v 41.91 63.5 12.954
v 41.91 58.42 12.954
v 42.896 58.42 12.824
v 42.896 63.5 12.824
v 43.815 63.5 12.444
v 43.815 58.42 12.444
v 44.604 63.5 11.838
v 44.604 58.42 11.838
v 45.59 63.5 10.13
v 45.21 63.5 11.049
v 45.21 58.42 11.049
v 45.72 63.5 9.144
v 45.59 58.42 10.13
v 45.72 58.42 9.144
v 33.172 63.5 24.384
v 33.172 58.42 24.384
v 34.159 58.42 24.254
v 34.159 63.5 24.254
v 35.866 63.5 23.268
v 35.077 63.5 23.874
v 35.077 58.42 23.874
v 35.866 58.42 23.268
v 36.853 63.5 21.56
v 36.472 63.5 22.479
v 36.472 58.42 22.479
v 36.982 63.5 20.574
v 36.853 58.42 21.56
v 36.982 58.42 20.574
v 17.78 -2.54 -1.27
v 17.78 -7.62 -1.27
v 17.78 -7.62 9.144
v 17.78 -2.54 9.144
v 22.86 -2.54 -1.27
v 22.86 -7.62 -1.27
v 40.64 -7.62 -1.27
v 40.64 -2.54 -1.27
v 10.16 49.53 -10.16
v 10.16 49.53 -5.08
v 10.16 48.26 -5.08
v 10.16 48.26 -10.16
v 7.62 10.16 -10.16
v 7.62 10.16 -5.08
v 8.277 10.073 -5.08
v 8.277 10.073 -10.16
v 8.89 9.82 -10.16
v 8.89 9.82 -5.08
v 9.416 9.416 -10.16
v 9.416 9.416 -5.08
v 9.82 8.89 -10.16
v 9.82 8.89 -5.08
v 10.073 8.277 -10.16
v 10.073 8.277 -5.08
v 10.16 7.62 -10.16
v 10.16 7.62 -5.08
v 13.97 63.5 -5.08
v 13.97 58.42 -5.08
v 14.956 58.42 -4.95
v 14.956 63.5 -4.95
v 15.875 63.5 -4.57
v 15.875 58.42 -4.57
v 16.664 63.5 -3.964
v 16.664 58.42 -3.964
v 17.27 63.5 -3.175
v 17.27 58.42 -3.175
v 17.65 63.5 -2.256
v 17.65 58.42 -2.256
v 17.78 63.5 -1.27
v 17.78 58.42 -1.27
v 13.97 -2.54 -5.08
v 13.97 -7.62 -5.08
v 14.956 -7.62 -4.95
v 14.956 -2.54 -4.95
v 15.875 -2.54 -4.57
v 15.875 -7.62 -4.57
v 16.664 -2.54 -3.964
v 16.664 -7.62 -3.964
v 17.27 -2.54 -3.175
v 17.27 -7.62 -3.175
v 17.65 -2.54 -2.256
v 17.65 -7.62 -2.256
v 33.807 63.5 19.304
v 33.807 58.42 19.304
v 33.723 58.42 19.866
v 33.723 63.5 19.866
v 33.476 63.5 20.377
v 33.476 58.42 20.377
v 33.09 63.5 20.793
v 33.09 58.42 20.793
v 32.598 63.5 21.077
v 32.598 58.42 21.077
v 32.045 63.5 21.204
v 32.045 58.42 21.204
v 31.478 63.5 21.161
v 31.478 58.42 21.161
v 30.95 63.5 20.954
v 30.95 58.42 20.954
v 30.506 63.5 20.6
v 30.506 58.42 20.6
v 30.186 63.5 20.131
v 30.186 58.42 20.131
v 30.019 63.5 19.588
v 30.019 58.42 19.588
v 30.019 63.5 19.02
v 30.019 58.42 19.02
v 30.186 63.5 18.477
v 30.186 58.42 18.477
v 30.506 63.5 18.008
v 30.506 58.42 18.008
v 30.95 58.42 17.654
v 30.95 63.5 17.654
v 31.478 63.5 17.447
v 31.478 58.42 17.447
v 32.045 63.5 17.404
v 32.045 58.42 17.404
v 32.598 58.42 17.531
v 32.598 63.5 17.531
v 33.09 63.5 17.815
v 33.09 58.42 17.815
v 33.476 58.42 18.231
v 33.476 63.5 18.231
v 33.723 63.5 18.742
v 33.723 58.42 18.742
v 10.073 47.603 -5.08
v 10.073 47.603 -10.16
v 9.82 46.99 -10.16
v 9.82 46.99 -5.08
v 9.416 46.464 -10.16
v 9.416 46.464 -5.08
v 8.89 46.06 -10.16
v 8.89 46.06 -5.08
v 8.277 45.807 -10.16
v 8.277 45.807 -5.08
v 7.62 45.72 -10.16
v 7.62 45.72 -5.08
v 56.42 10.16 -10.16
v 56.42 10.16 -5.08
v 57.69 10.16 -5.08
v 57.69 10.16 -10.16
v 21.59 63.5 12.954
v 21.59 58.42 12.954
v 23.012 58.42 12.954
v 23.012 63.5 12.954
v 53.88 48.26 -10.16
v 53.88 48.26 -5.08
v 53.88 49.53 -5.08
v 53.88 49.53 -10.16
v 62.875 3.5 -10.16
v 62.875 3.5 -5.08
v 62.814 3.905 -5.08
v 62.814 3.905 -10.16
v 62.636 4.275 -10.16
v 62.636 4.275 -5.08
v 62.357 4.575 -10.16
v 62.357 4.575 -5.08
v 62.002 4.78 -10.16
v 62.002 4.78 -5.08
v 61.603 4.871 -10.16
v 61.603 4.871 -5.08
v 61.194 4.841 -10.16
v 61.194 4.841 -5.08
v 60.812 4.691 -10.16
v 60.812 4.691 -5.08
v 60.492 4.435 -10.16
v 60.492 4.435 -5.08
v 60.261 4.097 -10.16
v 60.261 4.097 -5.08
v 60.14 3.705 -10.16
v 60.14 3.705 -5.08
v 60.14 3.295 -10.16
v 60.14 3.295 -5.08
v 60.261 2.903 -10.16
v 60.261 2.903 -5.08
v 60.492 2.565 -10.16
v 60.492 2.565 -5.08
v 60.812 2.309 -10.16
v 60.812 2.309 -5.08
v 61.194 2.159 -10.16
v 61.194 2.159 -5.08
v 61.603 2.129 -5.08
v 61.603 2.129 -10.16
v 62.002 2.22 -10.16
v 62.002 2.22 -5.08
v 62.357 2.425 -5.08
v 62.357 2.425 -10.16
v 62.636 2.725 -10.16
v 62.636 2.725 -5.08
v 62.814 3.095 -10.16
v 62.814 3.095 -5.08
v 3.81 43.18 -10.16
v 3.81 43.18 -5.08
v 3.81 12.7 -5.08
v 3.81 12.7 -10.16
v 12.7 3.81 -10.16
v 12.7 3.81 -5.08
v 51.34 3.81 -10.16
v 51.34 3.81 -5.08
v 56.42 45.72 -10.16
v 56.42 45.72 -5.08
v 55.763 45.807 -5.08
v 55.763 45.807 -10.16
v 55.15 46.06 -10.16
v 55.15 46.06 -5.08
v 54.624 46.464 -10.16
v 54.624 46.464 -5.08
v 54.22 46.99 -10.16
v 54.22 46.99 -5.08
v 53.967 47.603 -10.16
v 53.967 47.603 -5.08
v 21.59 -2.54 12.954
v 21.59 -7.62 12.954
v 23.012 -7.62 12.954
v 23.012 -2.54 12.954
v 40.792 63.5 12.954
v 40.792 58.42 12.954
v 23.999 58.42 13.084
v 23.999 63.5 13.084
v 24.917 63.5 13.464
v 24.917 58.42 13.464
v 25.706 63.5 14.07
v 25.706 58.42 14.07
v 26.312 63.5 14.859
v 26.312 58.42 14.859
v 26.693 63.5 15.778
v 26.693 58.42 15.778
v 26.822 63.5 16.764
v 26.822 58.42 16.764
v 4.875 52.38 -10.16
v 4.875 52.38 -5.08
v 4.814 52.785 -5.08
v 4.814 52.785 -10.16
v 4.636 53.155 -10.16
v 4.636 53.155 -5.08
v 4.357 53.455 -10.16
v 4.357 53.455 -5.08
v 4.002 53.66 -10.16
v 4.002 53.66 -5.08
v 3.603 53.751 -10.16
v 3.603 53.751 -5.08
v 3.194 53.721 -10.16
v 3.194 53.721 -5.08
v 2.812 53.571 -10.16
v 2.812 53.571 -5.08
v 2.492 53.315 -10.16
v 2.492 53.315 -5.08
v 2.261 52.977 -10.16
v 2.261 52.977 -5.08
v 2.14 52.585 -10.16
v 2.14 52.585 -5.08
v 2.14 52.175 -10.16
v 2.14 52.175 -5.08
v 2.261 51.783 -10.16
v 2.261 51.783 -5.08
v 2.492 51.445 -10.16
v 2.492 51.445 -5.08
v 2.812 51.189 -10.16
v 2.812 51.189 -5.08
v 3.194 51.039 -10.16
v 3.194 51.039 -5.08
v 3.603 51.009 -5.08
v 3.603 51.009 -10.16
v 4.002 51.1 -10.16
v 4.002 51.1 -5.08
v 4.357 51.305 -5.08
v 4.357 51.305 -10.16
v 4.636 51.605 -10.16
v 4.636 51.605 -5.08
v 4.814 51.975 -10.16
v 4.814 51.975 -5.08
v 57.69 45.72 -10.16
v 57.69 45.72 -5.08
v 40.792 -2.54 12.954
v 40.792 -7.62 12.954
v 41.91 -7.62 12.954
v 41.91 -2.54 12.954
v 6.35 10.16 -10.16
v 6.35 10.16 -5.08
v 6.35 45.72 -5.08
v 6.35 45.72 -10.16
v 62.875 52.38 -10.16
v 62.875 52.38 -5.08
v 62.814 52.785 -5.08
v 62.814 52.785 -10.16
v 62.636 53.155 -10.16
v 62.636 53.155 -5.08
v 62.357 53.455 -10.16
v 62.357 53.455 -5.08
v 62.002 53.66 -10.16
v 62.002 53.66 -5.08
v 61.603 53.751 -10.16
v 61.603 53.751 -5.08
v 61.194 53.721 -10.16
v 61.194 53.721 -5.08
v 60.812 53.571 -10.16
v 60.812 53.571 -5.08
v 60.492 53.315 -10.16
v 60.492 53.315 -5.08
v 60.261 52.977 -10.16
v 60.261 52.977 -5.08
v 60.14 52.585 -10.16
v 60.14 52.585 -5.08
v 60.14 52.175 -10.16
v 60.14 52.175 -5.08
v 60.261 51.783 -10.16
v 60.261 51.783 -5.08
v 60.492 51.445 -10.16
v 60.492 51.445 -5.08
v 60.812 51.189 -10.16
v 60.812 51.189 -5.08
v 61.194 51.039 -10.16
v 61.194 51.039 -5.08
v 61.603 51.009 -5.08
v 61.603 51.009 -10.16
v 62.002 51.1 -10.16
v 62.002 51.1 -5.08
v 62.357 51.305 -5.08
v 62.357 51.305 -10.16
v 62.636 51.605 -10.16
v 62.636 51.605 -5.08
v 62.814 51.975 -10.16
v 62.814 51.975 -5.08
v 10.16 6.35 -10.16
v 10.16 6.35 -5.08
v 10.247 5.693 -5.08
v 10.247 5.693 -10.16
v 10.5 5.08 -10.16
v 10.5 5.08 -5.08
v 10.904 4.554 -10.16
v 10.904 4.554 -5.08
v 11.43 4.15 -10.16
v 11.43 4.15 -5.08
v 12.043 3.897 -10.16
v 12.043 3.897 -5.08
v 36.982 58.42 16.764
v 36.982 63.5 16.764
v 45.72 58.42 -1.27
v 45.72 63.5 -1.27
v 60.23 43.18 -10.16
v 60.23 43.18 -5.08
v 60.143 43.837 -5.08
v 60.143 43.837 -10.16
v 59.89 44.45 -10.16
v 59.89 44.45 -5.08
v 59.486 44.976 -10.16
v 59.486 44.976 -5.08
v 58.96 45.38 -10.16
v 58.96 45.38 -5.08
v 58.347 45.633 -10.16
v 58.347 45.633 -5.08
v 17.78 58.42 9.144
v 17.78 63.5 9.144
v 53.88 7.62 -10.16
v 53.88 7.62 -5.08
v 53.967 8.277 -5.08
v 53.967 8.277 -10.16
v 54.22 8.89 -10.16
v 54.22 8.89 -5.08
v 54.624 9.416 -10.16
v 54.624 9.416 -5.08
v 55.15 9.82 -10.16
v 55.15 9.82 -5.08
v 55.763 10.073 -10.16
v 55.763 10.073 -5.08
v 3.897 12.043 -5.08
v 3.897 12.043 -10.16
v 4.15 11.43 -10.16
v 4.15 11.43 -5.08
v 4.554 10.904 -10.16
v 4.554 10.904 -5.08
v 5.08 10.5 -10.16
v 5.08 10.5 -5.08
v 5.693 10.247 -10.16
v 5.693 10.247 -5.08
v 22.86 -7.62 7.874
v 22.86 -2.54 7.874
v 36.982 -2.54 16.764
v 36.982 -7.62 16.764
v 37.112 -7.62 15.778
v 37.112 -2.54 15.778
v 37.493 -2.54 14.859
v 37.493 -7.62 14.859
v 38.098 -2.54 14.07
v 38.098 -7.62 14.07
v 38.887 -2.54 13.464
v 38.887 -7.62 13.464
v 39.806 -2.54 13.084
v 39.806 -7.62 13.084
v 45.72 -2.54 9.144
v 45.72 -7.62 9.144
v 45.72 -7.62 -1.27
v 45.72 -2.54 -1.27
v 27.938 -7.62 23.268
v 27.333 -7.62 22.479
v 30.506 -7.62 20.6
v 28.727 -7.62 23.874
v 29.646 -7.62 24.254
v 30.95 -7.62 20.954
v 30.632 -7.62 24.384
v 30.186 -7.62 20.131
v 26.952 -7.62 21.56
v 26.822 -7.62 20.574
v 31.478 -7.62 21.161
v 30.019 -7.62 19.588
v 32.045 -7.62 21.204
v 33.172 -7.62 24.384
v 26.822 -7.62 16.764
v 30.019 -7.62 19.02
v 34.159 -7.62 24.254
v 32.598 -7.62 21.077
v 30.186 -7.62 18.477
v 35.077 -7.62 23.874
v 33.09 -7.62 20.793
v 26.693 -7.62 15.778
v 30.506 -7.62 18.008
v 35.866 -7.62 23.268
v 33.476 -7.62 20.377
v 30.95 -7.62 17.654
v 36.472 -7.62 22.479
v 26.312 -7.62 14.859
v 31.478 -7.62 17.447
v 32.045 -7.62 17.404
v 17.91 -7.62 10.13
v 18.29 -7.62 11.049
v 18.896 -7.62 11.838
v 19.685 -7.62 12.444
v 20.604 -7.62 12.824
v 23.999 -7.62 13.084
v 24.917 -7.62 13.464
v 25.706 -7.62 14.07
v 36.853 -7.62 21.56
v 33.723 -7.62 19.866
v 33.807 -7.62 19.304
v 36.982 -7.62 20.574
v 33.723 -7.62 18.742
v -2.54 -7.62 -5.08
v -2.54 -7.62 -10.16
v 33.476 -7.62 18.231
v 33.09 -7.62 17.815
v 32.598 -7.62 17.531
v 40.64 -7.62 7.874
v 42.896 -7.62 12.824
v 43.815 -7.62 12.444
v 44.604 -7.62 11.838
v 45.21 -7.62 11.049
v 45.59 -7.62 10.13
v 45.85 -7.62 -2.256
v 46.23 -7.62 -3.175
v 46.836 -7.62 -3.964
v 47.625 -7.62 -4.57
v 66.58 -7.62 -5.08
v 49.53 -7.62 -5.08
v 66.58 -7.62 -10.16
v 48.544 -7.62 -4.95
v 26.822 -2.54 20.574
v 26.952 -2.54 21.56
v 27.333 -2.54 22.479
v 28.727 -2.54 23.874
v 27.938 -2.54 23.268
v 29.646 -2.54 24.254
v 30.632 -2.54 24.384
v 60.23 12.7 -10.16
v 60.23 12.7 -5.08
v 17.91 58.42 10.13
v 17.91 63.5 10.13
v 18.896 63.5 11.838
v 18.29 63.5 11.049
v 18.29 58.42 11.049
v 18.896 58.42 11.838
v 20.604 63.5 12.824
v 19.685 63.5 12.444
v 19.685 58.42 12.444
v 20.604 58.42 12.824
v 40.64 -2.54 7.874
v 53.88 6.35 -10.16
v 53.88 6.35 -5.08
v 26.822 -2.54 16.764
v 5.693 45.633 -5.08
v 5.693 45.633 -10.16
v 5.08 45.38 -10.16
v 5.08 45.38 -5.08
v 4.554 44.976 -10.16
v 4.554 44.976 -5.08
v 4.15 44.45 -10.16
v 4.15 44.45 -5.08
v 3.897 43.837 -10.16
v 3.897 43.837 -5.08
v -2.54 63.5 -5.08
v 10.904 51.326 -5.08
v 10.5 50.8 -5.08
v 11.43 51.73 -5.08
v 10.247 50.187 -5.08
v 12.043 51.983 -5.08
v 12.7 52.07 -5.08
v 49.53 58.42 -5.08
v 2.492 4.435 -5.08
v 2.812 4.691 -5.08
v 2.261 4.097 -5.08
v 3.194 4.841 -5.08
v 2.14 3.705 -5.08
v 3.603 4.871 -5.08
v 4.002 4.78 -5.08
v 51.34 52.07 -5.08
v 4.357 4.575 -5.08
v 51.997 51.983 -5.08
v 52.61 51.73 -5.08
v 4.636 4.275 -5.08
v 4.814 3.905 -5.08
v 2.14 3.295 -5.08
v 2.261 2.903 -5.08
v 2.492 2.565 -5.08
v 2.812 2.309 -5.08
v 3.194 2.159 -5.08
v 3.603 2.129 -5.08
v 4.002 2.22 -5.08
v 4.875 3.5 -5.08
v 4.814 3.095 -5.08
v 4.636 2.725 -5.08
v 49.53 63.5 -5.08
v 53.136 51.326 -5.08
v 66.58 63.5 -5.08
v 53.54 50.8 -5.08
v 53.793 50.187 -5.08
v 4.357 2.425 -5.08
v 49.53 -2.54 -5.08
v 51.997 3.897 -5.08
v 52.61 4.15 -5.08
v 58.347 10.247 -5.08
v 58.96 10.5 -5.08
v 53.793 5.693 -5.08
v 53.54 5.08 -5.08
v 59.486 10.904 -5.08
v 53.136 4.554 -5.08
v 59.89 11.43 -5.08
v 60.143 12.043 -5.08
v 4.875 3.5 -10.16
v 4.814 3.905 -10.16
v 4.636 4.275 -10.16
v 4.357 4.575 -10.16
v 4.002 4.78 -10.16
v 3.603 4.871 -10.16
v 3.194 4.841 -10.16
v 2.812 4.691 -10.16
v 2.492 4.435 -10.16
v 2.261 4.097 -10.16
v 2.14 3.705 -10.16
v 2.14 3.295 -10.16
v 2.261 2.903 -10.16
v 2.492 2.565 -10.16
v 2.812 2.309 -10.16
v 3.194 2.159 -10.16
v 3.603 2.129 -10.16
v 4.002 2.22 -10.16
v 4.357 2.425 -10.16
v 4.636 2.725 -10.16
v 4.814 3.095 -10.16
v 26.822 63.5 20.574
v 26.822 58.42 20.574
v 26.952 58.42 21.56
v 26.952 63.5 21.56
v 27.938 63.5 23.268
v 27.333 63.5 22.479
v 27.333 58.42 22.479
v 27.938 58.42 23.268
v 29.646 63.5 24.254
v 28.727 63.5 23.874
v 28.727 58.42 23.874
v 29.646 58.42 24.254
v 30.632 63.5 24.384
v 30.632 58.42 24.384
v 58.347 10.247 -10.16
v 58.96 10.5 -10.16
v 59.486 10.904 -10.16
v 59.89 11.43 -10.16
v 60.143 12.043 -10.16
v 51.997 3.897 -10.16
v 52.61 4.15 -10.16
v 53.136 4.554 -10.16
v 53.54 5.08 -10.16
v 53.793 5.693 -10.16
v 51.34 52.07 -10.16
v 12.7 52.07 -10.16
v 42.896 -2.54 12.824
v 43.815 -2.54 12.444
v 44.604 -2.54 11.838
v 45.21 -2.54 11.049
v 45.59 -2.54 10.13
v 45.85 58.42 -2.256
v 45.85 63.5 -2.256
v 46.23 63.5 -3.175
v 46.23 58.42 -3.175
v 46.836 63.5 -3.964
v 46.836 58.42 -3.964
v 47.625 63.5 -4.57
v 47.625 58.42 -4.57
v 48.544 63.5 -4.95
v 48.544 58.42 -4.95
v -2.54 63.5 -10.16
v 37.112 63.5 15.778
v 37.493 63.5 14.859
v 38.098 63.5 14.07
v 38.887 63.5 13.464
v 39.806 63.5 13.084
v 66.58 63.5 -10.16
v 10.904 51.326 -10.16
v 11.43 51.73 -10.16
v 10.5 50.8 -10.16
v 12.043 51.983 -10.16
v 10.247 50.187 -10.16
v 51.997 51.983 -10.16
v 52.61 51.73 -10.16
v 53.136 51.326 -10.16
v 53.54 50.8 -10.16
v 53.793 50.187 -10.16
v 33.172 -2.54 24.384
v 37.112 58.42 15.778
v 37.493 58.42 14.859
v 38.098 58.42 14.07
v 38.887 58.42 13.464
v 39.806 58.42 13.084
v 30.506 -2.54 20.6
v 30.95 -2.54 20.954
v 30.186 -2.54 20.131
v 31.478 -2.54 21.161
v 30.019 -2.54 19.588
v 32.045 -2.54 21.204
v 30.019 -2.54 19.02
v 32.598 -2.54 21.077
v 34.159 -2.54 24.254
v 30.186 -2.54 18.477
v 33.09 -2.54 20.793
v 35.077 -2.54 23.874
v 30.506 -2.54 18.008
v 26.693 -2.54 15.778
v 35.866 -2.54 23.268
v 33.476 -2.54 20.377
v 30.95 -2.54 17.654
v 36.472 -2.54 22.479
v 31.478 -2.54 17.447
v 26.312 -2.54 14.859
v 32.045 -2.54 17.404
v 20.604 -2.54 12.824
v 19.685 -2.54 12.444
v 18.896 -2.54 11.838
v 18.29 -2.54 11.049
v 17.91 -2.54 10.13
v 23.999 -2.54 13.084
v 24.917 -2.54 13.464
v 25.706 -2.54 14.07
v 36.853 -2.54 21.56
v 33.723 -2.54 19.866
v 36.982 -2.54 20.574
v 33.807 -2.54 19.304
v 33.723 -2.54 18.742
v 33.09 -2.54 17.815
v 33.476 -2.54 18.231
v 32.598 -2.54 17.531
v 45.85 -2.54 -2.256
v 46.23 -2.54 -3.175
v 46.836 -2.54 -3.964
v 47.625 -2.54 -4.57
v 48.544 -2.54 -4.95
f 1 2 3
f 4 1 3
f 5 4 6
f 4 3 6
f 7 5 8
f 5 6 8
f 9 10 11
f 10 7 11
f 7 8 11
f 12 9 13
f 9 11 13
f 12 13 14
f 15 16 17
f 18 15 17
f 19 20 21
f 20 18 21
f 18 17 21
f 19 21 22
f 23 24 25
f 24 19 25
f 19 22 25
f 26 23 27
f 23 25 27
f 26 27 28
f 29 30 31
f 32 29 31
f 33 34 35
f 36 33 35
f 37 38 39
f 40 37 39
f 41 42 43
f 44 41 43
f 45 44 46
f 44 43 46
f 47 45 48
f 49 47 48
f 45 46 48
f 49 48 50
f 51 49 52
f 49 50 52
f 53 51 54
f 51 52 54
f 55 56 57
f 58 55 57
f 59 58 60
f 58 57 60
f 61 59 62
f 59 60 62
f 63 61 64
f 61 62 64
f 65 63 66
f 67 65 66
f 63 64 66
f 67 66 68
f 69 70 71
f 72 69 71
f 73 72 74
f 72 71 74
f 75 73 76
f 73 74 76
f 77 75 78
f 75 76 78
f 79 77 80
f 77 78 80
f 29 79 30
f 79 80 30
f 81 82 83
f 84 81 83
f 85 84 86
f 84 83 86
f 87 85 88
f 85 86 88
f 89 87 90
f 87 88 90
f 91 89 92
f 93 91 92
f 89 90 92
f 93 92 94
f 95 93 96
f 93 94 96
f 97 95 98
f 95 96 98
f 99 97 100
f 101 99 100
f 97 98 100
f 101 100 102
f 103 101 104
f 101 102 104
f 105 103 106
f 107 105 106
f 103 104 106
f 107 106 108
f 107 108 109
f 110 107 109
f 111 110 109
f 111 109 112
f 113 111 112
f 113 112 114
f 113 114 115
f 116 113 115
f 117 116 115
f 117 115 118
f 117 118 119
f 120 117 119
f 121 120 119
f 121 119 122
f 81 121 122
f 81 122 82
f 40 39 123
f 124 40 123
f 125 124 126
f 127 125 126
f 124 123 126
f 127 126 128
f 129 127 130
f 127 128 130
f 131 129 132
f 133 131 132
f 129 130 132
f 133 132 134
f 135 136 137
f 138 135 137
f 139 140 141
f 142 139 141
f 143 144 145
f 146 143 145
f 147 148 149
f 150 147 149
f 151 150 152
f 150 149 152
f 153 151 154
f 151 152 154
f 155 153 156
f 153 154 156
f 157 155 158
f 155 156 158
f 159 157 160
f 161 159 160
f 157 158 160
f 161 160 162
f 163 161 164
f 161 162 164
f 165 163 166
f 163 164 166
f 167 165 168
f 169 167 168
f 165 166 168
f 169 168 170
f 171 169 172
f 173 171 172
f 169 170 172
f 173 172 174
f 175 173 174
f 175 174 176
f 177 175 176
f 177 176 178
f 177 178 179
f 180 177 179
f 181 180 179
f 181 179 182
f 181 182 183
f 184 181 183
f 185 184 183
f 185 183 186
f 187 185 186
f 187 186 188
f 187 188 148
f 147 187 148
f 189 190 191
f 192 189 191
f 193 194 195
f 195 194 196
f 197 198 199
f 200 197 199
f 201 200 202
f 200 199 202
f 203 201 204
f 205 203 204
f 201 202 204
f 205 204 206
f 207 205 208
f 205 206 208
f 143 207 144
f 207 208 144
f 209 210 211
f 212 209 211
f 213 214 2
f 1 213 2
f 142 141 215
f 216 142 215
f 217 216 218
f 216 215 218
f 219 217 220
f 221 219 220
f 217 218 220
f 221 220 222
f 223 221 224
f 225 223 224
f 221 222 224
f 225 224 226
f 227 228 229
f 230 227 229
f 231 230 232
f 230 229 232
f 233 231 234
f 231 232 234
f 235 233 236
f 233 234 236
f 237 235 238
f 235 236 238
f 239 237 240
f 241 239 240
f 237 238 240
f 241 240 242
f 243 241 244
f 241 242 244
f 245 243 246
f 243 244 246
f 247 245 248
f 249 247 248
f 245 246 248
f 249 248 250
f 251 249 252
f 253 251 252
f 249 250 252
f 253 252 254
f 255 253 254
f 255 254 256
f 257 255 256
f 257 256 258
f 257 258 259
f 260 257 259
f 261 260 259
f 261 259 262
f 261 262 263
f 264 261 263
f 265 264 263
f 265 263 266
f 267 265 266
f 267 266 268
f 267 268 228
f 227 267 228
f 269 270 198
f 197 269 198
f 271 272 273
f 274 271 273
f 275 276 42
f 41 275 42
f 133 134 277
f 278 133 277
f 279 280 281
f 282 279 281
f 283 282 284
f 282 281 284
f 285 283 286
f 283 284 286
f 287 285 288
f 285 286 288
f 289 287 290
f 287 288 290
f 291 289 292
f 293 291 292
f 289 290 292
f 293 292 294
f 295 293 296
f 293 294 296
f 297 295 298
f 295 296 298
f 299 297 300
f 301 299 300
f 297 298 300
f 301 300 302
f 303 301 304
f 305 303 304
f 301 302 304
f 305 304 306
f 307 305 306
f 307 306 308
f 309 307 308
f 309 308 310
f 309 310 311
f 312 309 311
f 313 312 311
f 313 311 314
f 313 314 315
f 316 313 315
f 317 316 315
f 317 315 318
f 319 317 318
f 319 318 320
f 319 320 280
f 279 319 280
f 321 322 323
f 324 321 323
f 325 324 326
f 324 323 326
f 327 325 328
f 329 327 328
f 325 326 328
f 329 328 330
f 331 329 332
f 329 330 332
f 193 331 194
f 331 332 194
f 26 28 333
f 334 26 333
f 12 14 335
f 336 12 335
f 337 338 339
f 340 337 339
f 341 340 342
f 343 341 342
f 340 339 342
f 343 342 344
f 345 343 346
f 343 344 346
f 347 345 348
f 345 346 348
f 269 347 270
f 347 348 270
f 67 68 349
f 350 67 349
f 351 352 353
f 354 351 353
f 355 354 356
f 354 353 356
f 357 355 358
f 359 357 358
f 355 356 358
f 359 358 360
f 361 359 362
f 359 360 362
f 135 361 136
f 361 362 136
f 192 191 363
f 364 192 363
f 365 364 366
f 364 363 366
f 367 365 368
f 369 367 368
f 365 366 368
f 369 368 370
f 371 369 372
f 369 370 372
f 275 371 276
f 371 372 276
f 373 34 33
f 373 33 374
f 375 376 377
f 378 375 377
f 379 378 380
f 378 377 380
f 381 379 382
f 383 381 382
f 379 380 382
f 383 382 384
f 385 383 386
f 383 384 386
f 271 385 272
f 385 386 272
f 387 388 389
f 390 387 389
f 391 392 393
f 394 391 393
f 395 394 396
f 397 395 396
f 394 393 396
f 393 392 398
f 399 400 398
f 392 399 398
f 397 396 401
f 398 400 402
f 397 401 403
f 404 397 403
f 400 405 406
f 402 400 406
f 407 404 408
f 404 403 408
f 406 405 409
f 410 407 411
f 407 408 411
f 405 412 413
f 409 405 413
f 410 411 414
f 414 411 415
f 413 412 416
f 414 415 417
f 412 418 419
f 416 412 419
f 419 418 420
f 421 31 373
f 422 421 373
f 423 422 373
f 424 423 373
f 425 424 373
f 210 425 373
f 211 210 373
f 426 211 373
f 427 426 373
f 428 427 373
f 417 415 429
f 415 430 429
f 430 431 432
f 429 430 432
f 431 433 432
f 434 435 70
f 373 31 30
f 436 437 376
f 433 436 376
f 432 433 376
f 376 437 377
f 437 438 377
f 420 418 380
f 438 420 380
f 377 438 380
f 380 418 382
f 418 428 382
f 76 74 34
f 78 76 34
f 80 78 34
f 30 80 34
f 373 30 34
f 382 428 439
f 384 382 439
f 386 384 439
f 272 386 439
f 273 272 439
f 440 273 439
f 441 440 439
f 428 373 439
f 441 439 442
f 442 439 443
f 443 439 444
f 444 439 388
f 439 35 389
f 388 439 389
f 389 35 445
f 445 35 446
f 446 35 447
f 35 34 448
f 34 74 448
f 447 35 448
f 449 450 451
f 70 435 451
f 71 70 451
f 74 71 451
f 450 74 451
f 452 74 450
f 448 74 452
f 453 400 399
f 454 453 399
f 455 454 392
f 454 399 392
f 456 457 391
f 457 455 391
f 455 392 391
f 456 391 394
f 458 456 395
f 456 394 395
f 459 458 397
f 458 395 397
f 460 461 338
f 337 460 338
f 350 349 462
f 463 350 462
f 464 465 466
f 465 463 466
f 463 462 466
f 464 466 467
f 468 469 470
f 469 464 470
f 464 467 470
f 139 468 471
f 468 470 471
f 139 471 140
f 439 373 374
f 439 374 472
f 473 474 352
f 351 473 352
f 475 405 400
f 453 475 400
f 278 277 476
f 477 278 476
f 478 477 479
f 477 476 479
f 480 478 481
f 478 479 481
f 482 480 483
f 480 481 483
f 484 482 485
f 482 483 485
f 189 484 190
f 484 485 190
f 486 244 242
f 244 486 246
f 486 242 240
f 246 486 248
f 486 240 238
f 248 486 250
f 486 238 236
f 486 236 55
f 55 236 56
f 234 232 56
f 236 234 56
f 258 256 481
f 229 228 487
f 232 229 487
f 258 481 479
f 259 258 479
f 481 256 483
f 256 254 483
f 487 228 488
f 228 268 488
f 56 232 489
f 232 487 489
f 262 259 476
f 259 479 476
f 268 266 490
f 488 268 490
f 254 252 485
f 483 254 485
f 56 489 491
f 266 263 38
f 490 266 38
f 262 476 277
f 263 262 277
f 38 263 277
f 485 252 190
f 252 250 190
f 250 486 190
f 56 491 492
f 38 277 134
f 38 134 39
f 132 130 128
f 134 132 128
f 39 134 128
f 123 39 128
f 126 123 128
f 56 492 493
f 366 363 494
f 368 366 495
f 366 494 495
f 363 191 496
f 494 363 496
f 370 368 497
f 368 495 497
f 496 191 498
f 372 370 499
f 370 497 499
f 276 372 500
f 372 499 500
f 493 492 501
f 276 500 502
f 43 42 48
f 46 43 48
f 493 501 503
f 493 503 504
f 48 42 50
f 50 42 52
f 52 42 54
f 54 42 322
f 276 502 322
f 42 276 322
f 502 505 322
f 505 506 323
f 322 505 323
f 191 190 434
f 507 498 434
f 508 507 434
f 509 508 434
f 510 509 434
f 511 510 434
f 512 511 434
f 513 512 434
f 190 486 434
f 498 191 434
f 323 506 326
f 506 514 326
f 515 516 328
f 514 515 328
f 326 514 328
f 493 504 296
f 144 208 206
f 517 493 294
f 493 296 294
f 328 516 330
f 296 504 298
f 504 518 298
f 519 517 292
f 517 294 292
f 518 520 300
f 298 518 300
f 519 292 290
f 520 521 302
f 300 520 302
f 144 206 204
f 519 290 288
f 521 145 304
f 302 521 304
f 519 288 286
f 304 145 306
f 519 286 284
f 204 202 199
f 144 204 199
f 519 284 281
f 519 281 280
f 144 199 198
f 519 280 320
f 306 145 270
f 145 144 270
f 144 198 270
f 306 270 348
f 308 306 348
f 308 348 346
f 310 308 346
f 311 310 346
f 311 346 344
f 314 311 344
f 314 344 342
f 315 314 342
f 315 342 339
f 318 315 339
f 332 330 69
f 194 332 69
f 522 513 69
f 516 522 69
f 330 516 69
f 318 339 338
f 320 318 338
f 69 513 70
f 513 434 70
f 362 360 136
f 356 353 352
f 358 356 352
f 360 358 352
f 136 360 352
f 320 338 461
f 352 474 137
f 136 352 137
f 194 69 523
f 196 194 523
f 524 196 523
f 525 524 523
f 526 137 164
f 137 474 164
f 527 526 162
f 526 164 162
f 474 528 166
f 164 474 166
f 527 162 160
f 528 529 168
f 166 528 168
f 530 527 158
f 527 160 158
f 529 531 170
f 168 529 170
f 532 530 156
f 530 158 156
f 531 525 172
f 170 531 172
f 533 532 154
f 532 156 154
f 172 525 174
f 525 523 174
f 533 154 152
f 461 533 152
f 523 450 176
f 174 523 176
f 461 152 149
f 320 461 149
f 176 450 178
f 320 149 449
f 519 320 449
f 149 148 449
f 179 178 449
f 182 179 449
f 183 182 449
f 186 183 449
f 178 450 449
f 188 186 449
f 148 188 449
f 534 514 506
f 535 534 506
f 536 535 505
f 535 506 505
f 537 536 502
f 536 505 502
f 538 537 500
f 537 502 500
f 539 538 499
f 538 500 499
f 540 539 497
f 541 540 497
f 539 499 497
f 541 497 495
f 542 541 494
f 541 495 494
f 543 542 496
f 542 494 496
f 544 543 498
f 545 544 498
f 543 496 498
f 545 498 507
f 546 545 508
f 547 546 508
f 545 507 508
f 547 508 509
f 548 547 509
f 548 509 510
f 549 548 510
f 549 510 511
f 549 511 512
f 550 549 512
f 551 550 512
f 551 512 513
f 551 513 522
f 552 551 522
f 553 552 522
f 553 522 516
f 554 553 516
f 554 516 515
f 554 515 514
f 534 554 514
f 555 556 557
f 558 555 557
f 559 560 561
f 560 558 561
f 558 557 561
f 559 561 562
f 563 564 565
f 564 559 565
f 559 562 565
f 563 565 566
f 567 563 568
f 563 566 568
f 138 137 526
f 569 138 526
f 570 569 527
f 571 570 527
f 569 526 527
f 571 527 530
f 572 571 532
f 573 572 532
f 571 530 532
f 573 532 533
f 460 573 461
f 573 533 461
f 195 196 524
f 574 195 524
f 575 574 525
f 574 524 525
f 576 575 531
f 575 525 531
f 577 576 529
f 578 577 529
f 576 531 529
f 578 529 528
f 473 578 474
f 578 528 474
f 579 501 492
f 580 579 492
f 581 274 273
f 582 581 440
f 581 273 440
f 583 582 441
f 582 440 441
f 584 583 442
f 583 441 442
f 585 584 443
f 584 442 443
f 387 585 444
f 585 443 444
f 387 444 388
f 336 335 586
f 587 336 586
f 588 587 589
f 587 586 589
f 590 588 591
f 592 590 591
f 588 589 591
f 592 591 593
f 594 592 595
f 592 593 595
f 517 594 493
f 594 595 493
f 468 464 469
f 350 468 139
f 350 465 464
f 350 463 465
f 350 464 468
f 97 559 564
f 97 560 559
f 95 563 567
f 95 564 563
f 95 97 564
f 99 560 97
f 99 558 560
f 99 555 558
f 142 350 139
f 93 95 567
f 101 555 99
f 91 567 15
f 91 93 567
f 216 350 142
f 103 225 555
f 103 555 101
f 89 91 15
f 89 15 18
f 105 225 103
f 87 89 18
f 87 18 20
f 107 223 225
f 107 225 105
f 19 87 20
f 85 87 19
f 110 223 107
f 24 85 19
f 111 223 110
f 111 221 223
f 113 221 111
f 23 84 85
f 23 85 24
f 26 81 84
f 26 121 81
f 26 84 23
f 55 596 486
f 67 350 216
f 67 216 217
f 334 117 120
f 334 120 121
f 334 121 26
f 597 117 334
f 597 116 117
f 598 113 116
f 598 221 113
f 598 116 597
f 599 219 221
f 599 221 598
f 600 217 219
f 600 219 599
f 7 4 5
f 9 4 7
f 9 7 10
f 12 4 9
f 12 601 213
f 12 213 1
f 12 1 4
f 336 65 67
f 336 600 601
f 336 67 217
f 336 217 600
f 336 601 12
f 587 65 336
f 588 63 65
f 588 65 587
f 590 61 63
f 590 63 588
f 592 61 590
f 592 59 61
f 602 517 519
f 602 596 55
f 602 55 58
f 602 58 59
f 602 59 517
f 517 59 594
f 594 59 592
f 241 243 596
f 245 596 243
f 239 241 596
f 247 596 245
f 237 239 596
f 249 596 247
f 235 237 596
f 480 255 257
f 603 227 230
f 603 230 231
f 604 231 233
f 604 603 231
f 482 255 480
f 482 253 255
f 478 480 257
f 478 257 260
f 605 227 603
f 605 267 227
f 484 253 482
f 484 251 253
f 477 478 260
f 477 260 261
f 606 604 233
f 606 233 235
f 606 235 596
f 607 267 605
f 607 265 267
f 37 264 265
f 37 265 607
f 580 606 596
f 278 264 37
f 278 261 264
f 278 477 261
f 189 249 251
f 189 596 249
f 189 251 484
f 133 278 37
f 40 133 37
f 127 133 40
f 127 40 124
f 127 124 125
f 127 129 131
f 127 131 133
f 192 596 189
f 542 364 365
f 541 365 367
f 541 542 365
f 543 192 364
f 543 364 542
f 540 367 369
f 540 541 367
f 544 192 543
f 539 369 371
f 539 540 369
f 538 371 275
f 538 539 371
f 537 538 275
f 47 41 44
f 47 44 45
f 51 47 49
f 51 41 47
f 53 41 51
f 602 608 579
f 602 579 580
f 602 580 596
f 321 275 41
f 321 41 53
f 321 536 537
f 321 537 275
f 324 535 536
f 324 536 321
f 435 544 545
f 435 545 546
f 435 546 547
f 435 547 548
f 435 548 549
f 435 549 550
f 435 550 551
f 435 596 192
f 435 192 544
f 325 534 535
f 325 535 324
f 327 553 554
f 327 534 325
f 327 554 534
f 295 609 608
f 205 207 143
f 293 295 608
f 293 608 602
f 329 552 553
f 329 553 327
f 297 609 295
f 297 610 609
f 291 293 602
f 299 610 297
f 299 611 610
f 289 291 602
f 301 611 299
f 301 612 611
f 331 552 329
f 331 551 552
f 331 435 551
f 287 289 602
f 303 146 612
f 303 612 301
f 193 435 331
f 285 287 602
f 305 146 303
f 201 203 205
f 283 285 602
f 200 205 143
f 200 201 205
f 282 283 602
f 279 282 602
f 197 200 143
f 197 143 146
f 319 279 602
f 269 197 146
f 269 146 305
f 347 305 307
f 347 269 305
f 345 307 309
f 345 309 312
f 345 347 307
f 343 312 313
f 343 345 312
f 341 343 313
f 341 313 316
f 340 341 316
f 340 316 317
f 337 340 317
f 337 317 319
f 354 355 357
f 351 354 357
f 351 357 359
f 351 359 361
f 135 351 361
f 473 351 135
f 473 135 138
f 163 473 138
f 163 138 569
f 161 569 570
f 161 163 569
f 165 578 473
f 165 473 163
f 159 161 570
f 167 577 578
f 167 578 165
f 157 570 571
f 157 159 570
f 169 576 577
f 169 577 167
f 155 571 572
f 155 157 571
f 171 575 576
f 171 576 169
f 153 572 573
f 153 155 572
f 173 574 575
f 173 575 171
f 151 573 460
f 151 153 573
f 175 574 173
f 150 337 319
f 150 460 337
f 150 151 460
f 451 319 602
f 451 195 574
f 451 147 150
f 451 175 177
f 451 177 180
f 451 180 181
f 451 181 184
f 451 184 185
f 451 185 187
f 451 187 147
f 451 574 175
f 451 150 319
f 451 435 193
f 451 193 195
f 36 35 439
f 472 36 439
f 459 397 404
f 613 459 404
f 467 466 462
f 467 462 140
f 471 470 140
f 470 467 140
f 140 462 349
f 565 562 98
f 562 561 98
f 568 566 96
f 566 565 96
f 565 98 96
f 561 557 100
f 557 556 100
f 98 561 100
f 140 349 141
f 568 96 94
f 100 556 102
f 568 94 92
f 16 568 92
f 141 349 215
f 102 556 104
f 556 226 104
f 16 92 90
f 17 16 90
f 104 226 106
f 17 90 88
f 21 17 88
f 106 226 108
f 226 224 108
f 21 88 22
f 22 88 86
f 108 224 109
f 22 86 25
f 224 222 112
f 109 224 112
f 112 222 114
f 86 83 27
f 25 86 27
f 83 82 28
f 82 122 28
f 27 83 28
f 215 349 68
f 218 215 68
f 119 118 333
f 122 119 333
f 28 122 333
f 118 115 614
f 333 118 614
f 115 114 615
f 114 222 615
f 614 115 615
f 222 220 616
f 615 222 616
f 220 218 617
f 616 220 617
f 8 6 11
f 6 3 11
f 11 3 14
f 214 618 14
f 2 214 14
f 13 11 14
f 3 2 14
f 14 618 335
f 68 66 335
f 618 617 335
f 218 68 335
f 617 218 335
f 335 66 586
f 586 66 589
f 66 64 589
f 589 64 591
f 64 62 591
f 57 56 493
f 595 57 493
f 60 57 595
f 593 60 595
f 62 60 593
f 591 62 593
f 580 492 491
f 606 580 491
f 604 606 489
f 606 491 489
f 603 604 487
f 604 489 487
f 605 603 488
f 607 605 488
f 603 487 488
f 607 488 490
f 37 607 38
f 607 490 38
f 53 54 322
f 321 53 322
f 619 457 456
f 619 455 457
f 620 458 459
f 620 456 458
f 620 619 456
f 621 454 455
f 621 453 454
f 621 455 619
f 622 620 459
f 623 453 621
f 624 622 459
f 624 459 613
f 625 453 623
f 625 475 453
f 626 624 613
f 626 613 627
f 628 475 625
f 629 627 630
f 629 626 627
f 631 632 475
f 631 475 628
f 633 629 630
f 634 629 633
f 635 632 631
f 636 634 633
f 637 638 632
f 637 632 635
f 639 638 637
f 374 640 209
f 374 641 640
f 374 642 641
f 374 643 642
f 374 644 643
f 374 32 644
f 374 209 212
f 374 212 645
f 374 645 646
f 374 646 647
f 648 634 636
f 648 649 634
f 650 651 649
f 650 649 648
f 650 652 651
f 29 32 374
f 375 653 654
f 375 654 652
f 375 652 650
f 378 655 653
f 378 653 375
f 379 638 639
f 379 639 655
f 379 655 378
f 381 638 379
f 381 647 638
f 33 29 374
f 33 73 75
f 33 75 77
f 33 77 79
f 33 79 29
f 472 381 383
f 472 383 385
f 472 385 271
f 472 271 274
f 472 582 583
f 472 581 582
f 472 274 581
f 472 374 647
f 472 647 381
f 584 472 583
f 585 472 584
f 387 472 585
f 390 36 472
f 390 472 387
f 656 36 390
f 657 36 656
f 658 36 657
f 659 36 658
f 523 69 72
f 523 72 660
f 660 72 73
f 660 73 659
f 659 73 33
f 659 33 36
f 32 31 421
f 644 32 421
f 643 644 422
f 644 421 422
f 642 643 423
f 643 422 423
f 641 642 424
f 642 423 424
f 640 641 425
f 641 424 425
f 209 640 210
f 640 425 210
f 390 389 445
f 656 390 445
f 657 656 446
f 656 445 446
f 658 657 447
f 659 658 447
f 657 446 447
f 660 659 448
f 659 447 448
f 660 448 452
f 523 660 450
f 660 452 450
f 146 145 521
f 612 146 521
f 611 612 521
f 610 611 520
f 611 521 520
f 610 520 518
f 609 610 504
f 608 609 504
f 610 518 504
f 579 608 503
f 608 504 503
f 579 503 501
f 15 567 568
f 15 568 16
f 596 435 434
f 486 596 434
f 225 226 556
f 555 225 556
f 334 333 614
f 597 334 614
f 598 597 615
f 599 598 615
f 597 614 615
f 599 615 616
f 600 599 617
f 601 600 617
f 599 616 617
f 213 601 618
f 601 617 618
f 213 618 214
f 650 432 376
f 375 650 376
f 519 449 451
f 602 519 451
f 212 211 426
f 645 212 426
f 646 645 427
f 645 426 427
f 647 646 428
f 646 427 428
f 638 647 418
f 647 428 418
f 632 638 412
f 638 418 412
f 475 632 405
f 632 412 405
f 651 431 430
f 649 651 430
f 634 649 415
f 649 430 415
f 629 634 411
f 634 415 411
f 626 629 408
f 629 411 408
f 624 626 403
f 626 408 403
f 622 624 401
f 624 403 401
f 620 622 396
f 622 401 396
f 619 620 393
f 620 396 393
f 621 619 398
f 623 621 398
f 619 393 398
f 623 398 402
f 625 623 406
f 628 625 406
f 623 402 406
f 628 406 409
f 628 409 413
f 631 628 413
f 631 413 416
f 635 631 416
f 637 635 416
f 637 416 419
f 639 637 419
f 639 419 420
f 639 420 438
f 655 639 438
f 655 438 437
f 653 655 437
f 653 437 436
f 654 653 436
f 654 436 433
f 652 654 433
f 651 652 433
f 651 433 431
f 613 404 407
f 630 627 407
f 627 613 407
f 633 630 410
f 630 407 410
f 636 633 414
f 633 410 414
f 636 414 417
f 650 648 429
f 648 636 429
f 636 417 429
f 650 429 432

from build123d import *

# Parameters (mm, degrees)
F0_W      = 100.33
F0_H      = 71.12
F0_W_2    = 90.17
F0_H_2    = 60.96
F1_DEPTH  = 5.08
F2_W      = 100.33
F2_H      = 71.12
F3_DEPTH  = 5.08
F0_R      = 1.375
F4_DEPTH  = 25.4
F5_R      = 3.1
F5_R_2    = 1.375
F6_DEPTH  = 3.556
F7_DEPTH  = 37.592
F8_W      = 13.716
F8_H      = 3.556
F9_DEPTH  = 5.08
F10_W     = 10.668
F10_H     = 5.715
F10_W_2   = 17.78
F10_H_2   = 9.144
F10_W_3   = 9.398
F10_H_3   = 8.89
F11_DEPTH = 5.08
F12_W     = 53.8226
F12_H     = 18.161
F13_DEPTH = 5.08
F14_R     = 1.905
F15_DEPTH = 71.121
F17_DEPTH = 71.121
F19_DEPTH = 5.08


with BuildPart() as f1:
    # F0 (on Top) → F1 (new body)
    with BuildSketch(Plane.XY):
        with Locations((42.545, 27.94)):
            Rectangle(F0_W, F0_H)
        with Locations((42.545, 27.94)):
            Rectangle(F0_W_2, F0_H_2, mode=Mode.SUBTRACT)
    extrude(amount=-F1_DEPTH)

    # F2 (on face) → F3 (join)
    with BuildSketch(Plane(origin=(0, 0, -5.08), x_dir=(1, 0, 0), z_dir=(0, 0, -1))):
        with Locations((42.545, -27.94)):
            Rectangle(F2_W, F2_H)
    extrude(amount=F3_DEPTH)

    # F0 (on Top) → F4 (cut)
    with BuildSketch(Plane.XY):
        with Locations((3.5, 52.38)):
            Circle(F0_R)
        with Locations((61.5, 52.38)):
            Circle(F0_R)
        with Locations((61.5, 3.5)):
            Circle(F0_R)
        with Locations((3.5, 3.5)):
            Circle(F0_R)
    extrude(amount=-F4_DEPTH, mode=Mode.SUBTRACT)

    # F5 (on face) → F6 (join)
    with BuildSketch(Plane.XY.offset(-5.08)):
        with Locations((3.5, 52.38)):
            Circle(F5_R)
        with Locations((3.5, 52.38)):
            Circle(F5_R_2, mode=Mode.SUBTRACT)
        with Locations((61.5, 52.38)):
            Circle(F5_R)
        with Locations((61.5, 52.38)):
            Circle(F5_R_2, mode=Mode.SUBTRACT)
        with Locations((61.5, 3.5)):
            Circle(F5_R)
        with Locations((61.5, 3.5)):
            Circle(F5_R_2, mode=Mode.SUBTRACT)
        with Locations((3.5, 3.5)):
            Circle(F5_R)
        with Locations((3.5, 3.5)):
            Circle(F5_R_2, mode=Mode.SUBTRACT)
    extrude(amount=F6_DEPTH)

    # F0 (on Top) → F7 (join)
    with BuildSketch(Plane.XY):
        with Locations((42.545, 27.94)):
            Rectangle(F0_W, F0_H)
        with Locations((42.545, 27.94)):
            Rectangle(F0_W_2, F0_H_2, mode=Mode.SUBTRACT)
    extrude(amount=F7_DEPTH)

    # F8 (on face) → F9 (cut, through all)
    with BuildSketch(Plane(origin=(-7.62, 0, 0), x_dir=(0, -1, 0), z_dir=(-1, 0, 0))):
        with Locations((-27.94, -2.032)):
            Rectangle(F8_W, F8_H)
    extrude(amount=-F9_DEPTH, mode=Mode.SUBTRACT)

    # F10 (on face) → F11 (cut, through all)
    with BuildSketch(Plane.XZ.offset(7.62)):
        with Locations((10.922, 1.5875)):
            Rectangle(F10_W, F10_H)
        with Locations((31.75, 3.302)):
            Rectangle(F10_W_2, F10_H_2)
        with Locations((53.594, 3.175)):
            Rectangle(F10_W_3, F10_H_3)
    extrude(amount=-F11_DEPTH, mode=Mode.SUBTRACT)

    # F12 (on face) → F13 (cut, through all)
    with BuildSketch(Plane.YZ.offset(92.71)):
        with Locations((28.8163, 7.8105)):
            Rectangle(F12_W, F12_H)
    extrude(amount=-F13_DEPTH, mode=Mode.SUBTRACT)

    # F14 (on face) → F15 (cut, through all)
    with BuildSketch(Plane.XZ.offset(7.62)):
        with Locations((31.9024, 19.304)):
            Circle(F14_R)
    extrude(amount=-F15_DEPTH, mode=Mode.SUBTRACT)

    # F16 (on face) → F17 (cut, through all)
    with BuildSketch(Plane.XZ.offset(7.62)):
        with BuildLine():
            Line((66.58, -5.08), (66.58, -10.16))
            Line((66.58, -10.16), (92.71, -10.16))
            Line((92.71, -10.16), (92.71, 37.592))
            Line((92.71, 37.592), (-7.62, 37.592))
            Line((-7.62, 37.592), (-7.62, -10.16))
            Line((-7.62, -10.16), (-2.54, -10.16))
            Line((-2.54, -10.16), (-2.54, -5.08))
            Line((-2.54, -5.08), (13.97, -5.08))
            ThreePointArc((13.97, -5.08), (16.664077, -3.964077), (17.78, -1.27))
            Line((17.78, -1.27), (17.78, 9.144))
            ThreePointArc((17.78, 9.144), (18.895923, 11.838077), (21.59, 12.954))
            Line((21.59, 12.954), (23.0124, 12.954))
            ThreePointArc((23.0124, 12.954), (25.706477, 14.069923), (26.8224, 16.764))
            Line((26.8224, 16.764), (26.8224, 20.574))
            ThreePointArc((26.8224, 20.574), (27.938323, 23.268077), (30.6324, 24.384))
            Line((30.6324, 24.384), (33.1724, 24.384))
            ThreePointArc((33.1724, 24.384), (35.866477, 23.268077), (36.9824, 20.574))
            Line((36.9824, 20.574), (36.9824, 16.764))
            ThreePointArc((36.9824, 16.764), (38.098323, 14.069923), (40.7924, 12.954))
            Line((40.7924, 12.954), (41.91, 12.954))
            ThreePointArc((41.91, 12.954), (44.604077, 11.838077), (45.72, 9.144))
            Line((45.72, 9.144), (45.72, -1.27))
            ThreePointArc((45.72, -1.27), (46.835923, -3.964077), (49.53, -5.08))
            Line((49.53, -5.08), (66.58, -5.08))
        make_face()
    extrude(amount=-F17_DEPTH, mode=Mode.SUBTRACT)

    # F18 (on face) → F19 (cut, through all)
    with BuildSketch(Plane.XY.offset(-5.08)):
        with BuildLine():
            Line((56.42, 10.16), (57.69, 10.16))
            ThreePointArc((57.69, 10.16), (59.486051, 10.903949), (60.23, 12.7))
            Line((60.23, 12.7), (60.23, 43.18))
            ThreePointArc((60.23, 43.18), (59.486051, 44.976051), (57.69, 45.72))
            Line((57.69, 45.72), (56.42, 45.72))
            ThreePointArc((56.42, 45.72), (54.623949, 46.463949), (53.88, 48.26))
            Line((53.88, 48.26), (53.88, 49.53))
            ThreePointArc((53.88, 49.53), (53.136051, 51.326051), (51.34, 52.07))
            Line((51.34, 52.07), (12.7, 52.07))
            ThreePointArc((12.7, 52.07), (10.903949, 51.326051), (10.16, 49.53))
            Line((10.16, 49.53), (10.16, 48.26))
            ThreePointArc((10.16, 48.26), (9.416051, 46.463949), (7.62, 45.72))
            Line((7.62, 45.72), (6.35, 45.72))
            ThreePointArc((6.35, 45.72), (4.553949, 44.976051), (3.81, 43.18))
            Line((3.81, 43.18), (3.81, 12.7))
            ThreePointArc((3.81, 12.7), (4.553949, 10.903949), (6.35, 10.16))
            Line((6.35, 10.16), (7.62, 10.16))
            ThreePointArc((7.62, 10.16), (9.416051, 9.416051), (10.16, 7.62))
            Line((10.16, 7.62), (10.16, 6.35))
            ThreePointArc((10.16, 6.35), (10.903949, 4.553949), (12.7, 3.81))
            Line((12.7, 3.81), (51.34, 3.81))
            ThreePointArc((51.34, 3.81), (53.136051, 4.553949), (53.88, 6.35))
            Line((53.88, 6.35), (53.88, 7.62))
            ThreePointArc((53.88, 7.62), (54.623949, 9.416051), (56.42, 10.16))
        make_face()
    extrude(amount=-F19_DEPTH, mode=Mode.SUBTRACT)


solid = f1.part
